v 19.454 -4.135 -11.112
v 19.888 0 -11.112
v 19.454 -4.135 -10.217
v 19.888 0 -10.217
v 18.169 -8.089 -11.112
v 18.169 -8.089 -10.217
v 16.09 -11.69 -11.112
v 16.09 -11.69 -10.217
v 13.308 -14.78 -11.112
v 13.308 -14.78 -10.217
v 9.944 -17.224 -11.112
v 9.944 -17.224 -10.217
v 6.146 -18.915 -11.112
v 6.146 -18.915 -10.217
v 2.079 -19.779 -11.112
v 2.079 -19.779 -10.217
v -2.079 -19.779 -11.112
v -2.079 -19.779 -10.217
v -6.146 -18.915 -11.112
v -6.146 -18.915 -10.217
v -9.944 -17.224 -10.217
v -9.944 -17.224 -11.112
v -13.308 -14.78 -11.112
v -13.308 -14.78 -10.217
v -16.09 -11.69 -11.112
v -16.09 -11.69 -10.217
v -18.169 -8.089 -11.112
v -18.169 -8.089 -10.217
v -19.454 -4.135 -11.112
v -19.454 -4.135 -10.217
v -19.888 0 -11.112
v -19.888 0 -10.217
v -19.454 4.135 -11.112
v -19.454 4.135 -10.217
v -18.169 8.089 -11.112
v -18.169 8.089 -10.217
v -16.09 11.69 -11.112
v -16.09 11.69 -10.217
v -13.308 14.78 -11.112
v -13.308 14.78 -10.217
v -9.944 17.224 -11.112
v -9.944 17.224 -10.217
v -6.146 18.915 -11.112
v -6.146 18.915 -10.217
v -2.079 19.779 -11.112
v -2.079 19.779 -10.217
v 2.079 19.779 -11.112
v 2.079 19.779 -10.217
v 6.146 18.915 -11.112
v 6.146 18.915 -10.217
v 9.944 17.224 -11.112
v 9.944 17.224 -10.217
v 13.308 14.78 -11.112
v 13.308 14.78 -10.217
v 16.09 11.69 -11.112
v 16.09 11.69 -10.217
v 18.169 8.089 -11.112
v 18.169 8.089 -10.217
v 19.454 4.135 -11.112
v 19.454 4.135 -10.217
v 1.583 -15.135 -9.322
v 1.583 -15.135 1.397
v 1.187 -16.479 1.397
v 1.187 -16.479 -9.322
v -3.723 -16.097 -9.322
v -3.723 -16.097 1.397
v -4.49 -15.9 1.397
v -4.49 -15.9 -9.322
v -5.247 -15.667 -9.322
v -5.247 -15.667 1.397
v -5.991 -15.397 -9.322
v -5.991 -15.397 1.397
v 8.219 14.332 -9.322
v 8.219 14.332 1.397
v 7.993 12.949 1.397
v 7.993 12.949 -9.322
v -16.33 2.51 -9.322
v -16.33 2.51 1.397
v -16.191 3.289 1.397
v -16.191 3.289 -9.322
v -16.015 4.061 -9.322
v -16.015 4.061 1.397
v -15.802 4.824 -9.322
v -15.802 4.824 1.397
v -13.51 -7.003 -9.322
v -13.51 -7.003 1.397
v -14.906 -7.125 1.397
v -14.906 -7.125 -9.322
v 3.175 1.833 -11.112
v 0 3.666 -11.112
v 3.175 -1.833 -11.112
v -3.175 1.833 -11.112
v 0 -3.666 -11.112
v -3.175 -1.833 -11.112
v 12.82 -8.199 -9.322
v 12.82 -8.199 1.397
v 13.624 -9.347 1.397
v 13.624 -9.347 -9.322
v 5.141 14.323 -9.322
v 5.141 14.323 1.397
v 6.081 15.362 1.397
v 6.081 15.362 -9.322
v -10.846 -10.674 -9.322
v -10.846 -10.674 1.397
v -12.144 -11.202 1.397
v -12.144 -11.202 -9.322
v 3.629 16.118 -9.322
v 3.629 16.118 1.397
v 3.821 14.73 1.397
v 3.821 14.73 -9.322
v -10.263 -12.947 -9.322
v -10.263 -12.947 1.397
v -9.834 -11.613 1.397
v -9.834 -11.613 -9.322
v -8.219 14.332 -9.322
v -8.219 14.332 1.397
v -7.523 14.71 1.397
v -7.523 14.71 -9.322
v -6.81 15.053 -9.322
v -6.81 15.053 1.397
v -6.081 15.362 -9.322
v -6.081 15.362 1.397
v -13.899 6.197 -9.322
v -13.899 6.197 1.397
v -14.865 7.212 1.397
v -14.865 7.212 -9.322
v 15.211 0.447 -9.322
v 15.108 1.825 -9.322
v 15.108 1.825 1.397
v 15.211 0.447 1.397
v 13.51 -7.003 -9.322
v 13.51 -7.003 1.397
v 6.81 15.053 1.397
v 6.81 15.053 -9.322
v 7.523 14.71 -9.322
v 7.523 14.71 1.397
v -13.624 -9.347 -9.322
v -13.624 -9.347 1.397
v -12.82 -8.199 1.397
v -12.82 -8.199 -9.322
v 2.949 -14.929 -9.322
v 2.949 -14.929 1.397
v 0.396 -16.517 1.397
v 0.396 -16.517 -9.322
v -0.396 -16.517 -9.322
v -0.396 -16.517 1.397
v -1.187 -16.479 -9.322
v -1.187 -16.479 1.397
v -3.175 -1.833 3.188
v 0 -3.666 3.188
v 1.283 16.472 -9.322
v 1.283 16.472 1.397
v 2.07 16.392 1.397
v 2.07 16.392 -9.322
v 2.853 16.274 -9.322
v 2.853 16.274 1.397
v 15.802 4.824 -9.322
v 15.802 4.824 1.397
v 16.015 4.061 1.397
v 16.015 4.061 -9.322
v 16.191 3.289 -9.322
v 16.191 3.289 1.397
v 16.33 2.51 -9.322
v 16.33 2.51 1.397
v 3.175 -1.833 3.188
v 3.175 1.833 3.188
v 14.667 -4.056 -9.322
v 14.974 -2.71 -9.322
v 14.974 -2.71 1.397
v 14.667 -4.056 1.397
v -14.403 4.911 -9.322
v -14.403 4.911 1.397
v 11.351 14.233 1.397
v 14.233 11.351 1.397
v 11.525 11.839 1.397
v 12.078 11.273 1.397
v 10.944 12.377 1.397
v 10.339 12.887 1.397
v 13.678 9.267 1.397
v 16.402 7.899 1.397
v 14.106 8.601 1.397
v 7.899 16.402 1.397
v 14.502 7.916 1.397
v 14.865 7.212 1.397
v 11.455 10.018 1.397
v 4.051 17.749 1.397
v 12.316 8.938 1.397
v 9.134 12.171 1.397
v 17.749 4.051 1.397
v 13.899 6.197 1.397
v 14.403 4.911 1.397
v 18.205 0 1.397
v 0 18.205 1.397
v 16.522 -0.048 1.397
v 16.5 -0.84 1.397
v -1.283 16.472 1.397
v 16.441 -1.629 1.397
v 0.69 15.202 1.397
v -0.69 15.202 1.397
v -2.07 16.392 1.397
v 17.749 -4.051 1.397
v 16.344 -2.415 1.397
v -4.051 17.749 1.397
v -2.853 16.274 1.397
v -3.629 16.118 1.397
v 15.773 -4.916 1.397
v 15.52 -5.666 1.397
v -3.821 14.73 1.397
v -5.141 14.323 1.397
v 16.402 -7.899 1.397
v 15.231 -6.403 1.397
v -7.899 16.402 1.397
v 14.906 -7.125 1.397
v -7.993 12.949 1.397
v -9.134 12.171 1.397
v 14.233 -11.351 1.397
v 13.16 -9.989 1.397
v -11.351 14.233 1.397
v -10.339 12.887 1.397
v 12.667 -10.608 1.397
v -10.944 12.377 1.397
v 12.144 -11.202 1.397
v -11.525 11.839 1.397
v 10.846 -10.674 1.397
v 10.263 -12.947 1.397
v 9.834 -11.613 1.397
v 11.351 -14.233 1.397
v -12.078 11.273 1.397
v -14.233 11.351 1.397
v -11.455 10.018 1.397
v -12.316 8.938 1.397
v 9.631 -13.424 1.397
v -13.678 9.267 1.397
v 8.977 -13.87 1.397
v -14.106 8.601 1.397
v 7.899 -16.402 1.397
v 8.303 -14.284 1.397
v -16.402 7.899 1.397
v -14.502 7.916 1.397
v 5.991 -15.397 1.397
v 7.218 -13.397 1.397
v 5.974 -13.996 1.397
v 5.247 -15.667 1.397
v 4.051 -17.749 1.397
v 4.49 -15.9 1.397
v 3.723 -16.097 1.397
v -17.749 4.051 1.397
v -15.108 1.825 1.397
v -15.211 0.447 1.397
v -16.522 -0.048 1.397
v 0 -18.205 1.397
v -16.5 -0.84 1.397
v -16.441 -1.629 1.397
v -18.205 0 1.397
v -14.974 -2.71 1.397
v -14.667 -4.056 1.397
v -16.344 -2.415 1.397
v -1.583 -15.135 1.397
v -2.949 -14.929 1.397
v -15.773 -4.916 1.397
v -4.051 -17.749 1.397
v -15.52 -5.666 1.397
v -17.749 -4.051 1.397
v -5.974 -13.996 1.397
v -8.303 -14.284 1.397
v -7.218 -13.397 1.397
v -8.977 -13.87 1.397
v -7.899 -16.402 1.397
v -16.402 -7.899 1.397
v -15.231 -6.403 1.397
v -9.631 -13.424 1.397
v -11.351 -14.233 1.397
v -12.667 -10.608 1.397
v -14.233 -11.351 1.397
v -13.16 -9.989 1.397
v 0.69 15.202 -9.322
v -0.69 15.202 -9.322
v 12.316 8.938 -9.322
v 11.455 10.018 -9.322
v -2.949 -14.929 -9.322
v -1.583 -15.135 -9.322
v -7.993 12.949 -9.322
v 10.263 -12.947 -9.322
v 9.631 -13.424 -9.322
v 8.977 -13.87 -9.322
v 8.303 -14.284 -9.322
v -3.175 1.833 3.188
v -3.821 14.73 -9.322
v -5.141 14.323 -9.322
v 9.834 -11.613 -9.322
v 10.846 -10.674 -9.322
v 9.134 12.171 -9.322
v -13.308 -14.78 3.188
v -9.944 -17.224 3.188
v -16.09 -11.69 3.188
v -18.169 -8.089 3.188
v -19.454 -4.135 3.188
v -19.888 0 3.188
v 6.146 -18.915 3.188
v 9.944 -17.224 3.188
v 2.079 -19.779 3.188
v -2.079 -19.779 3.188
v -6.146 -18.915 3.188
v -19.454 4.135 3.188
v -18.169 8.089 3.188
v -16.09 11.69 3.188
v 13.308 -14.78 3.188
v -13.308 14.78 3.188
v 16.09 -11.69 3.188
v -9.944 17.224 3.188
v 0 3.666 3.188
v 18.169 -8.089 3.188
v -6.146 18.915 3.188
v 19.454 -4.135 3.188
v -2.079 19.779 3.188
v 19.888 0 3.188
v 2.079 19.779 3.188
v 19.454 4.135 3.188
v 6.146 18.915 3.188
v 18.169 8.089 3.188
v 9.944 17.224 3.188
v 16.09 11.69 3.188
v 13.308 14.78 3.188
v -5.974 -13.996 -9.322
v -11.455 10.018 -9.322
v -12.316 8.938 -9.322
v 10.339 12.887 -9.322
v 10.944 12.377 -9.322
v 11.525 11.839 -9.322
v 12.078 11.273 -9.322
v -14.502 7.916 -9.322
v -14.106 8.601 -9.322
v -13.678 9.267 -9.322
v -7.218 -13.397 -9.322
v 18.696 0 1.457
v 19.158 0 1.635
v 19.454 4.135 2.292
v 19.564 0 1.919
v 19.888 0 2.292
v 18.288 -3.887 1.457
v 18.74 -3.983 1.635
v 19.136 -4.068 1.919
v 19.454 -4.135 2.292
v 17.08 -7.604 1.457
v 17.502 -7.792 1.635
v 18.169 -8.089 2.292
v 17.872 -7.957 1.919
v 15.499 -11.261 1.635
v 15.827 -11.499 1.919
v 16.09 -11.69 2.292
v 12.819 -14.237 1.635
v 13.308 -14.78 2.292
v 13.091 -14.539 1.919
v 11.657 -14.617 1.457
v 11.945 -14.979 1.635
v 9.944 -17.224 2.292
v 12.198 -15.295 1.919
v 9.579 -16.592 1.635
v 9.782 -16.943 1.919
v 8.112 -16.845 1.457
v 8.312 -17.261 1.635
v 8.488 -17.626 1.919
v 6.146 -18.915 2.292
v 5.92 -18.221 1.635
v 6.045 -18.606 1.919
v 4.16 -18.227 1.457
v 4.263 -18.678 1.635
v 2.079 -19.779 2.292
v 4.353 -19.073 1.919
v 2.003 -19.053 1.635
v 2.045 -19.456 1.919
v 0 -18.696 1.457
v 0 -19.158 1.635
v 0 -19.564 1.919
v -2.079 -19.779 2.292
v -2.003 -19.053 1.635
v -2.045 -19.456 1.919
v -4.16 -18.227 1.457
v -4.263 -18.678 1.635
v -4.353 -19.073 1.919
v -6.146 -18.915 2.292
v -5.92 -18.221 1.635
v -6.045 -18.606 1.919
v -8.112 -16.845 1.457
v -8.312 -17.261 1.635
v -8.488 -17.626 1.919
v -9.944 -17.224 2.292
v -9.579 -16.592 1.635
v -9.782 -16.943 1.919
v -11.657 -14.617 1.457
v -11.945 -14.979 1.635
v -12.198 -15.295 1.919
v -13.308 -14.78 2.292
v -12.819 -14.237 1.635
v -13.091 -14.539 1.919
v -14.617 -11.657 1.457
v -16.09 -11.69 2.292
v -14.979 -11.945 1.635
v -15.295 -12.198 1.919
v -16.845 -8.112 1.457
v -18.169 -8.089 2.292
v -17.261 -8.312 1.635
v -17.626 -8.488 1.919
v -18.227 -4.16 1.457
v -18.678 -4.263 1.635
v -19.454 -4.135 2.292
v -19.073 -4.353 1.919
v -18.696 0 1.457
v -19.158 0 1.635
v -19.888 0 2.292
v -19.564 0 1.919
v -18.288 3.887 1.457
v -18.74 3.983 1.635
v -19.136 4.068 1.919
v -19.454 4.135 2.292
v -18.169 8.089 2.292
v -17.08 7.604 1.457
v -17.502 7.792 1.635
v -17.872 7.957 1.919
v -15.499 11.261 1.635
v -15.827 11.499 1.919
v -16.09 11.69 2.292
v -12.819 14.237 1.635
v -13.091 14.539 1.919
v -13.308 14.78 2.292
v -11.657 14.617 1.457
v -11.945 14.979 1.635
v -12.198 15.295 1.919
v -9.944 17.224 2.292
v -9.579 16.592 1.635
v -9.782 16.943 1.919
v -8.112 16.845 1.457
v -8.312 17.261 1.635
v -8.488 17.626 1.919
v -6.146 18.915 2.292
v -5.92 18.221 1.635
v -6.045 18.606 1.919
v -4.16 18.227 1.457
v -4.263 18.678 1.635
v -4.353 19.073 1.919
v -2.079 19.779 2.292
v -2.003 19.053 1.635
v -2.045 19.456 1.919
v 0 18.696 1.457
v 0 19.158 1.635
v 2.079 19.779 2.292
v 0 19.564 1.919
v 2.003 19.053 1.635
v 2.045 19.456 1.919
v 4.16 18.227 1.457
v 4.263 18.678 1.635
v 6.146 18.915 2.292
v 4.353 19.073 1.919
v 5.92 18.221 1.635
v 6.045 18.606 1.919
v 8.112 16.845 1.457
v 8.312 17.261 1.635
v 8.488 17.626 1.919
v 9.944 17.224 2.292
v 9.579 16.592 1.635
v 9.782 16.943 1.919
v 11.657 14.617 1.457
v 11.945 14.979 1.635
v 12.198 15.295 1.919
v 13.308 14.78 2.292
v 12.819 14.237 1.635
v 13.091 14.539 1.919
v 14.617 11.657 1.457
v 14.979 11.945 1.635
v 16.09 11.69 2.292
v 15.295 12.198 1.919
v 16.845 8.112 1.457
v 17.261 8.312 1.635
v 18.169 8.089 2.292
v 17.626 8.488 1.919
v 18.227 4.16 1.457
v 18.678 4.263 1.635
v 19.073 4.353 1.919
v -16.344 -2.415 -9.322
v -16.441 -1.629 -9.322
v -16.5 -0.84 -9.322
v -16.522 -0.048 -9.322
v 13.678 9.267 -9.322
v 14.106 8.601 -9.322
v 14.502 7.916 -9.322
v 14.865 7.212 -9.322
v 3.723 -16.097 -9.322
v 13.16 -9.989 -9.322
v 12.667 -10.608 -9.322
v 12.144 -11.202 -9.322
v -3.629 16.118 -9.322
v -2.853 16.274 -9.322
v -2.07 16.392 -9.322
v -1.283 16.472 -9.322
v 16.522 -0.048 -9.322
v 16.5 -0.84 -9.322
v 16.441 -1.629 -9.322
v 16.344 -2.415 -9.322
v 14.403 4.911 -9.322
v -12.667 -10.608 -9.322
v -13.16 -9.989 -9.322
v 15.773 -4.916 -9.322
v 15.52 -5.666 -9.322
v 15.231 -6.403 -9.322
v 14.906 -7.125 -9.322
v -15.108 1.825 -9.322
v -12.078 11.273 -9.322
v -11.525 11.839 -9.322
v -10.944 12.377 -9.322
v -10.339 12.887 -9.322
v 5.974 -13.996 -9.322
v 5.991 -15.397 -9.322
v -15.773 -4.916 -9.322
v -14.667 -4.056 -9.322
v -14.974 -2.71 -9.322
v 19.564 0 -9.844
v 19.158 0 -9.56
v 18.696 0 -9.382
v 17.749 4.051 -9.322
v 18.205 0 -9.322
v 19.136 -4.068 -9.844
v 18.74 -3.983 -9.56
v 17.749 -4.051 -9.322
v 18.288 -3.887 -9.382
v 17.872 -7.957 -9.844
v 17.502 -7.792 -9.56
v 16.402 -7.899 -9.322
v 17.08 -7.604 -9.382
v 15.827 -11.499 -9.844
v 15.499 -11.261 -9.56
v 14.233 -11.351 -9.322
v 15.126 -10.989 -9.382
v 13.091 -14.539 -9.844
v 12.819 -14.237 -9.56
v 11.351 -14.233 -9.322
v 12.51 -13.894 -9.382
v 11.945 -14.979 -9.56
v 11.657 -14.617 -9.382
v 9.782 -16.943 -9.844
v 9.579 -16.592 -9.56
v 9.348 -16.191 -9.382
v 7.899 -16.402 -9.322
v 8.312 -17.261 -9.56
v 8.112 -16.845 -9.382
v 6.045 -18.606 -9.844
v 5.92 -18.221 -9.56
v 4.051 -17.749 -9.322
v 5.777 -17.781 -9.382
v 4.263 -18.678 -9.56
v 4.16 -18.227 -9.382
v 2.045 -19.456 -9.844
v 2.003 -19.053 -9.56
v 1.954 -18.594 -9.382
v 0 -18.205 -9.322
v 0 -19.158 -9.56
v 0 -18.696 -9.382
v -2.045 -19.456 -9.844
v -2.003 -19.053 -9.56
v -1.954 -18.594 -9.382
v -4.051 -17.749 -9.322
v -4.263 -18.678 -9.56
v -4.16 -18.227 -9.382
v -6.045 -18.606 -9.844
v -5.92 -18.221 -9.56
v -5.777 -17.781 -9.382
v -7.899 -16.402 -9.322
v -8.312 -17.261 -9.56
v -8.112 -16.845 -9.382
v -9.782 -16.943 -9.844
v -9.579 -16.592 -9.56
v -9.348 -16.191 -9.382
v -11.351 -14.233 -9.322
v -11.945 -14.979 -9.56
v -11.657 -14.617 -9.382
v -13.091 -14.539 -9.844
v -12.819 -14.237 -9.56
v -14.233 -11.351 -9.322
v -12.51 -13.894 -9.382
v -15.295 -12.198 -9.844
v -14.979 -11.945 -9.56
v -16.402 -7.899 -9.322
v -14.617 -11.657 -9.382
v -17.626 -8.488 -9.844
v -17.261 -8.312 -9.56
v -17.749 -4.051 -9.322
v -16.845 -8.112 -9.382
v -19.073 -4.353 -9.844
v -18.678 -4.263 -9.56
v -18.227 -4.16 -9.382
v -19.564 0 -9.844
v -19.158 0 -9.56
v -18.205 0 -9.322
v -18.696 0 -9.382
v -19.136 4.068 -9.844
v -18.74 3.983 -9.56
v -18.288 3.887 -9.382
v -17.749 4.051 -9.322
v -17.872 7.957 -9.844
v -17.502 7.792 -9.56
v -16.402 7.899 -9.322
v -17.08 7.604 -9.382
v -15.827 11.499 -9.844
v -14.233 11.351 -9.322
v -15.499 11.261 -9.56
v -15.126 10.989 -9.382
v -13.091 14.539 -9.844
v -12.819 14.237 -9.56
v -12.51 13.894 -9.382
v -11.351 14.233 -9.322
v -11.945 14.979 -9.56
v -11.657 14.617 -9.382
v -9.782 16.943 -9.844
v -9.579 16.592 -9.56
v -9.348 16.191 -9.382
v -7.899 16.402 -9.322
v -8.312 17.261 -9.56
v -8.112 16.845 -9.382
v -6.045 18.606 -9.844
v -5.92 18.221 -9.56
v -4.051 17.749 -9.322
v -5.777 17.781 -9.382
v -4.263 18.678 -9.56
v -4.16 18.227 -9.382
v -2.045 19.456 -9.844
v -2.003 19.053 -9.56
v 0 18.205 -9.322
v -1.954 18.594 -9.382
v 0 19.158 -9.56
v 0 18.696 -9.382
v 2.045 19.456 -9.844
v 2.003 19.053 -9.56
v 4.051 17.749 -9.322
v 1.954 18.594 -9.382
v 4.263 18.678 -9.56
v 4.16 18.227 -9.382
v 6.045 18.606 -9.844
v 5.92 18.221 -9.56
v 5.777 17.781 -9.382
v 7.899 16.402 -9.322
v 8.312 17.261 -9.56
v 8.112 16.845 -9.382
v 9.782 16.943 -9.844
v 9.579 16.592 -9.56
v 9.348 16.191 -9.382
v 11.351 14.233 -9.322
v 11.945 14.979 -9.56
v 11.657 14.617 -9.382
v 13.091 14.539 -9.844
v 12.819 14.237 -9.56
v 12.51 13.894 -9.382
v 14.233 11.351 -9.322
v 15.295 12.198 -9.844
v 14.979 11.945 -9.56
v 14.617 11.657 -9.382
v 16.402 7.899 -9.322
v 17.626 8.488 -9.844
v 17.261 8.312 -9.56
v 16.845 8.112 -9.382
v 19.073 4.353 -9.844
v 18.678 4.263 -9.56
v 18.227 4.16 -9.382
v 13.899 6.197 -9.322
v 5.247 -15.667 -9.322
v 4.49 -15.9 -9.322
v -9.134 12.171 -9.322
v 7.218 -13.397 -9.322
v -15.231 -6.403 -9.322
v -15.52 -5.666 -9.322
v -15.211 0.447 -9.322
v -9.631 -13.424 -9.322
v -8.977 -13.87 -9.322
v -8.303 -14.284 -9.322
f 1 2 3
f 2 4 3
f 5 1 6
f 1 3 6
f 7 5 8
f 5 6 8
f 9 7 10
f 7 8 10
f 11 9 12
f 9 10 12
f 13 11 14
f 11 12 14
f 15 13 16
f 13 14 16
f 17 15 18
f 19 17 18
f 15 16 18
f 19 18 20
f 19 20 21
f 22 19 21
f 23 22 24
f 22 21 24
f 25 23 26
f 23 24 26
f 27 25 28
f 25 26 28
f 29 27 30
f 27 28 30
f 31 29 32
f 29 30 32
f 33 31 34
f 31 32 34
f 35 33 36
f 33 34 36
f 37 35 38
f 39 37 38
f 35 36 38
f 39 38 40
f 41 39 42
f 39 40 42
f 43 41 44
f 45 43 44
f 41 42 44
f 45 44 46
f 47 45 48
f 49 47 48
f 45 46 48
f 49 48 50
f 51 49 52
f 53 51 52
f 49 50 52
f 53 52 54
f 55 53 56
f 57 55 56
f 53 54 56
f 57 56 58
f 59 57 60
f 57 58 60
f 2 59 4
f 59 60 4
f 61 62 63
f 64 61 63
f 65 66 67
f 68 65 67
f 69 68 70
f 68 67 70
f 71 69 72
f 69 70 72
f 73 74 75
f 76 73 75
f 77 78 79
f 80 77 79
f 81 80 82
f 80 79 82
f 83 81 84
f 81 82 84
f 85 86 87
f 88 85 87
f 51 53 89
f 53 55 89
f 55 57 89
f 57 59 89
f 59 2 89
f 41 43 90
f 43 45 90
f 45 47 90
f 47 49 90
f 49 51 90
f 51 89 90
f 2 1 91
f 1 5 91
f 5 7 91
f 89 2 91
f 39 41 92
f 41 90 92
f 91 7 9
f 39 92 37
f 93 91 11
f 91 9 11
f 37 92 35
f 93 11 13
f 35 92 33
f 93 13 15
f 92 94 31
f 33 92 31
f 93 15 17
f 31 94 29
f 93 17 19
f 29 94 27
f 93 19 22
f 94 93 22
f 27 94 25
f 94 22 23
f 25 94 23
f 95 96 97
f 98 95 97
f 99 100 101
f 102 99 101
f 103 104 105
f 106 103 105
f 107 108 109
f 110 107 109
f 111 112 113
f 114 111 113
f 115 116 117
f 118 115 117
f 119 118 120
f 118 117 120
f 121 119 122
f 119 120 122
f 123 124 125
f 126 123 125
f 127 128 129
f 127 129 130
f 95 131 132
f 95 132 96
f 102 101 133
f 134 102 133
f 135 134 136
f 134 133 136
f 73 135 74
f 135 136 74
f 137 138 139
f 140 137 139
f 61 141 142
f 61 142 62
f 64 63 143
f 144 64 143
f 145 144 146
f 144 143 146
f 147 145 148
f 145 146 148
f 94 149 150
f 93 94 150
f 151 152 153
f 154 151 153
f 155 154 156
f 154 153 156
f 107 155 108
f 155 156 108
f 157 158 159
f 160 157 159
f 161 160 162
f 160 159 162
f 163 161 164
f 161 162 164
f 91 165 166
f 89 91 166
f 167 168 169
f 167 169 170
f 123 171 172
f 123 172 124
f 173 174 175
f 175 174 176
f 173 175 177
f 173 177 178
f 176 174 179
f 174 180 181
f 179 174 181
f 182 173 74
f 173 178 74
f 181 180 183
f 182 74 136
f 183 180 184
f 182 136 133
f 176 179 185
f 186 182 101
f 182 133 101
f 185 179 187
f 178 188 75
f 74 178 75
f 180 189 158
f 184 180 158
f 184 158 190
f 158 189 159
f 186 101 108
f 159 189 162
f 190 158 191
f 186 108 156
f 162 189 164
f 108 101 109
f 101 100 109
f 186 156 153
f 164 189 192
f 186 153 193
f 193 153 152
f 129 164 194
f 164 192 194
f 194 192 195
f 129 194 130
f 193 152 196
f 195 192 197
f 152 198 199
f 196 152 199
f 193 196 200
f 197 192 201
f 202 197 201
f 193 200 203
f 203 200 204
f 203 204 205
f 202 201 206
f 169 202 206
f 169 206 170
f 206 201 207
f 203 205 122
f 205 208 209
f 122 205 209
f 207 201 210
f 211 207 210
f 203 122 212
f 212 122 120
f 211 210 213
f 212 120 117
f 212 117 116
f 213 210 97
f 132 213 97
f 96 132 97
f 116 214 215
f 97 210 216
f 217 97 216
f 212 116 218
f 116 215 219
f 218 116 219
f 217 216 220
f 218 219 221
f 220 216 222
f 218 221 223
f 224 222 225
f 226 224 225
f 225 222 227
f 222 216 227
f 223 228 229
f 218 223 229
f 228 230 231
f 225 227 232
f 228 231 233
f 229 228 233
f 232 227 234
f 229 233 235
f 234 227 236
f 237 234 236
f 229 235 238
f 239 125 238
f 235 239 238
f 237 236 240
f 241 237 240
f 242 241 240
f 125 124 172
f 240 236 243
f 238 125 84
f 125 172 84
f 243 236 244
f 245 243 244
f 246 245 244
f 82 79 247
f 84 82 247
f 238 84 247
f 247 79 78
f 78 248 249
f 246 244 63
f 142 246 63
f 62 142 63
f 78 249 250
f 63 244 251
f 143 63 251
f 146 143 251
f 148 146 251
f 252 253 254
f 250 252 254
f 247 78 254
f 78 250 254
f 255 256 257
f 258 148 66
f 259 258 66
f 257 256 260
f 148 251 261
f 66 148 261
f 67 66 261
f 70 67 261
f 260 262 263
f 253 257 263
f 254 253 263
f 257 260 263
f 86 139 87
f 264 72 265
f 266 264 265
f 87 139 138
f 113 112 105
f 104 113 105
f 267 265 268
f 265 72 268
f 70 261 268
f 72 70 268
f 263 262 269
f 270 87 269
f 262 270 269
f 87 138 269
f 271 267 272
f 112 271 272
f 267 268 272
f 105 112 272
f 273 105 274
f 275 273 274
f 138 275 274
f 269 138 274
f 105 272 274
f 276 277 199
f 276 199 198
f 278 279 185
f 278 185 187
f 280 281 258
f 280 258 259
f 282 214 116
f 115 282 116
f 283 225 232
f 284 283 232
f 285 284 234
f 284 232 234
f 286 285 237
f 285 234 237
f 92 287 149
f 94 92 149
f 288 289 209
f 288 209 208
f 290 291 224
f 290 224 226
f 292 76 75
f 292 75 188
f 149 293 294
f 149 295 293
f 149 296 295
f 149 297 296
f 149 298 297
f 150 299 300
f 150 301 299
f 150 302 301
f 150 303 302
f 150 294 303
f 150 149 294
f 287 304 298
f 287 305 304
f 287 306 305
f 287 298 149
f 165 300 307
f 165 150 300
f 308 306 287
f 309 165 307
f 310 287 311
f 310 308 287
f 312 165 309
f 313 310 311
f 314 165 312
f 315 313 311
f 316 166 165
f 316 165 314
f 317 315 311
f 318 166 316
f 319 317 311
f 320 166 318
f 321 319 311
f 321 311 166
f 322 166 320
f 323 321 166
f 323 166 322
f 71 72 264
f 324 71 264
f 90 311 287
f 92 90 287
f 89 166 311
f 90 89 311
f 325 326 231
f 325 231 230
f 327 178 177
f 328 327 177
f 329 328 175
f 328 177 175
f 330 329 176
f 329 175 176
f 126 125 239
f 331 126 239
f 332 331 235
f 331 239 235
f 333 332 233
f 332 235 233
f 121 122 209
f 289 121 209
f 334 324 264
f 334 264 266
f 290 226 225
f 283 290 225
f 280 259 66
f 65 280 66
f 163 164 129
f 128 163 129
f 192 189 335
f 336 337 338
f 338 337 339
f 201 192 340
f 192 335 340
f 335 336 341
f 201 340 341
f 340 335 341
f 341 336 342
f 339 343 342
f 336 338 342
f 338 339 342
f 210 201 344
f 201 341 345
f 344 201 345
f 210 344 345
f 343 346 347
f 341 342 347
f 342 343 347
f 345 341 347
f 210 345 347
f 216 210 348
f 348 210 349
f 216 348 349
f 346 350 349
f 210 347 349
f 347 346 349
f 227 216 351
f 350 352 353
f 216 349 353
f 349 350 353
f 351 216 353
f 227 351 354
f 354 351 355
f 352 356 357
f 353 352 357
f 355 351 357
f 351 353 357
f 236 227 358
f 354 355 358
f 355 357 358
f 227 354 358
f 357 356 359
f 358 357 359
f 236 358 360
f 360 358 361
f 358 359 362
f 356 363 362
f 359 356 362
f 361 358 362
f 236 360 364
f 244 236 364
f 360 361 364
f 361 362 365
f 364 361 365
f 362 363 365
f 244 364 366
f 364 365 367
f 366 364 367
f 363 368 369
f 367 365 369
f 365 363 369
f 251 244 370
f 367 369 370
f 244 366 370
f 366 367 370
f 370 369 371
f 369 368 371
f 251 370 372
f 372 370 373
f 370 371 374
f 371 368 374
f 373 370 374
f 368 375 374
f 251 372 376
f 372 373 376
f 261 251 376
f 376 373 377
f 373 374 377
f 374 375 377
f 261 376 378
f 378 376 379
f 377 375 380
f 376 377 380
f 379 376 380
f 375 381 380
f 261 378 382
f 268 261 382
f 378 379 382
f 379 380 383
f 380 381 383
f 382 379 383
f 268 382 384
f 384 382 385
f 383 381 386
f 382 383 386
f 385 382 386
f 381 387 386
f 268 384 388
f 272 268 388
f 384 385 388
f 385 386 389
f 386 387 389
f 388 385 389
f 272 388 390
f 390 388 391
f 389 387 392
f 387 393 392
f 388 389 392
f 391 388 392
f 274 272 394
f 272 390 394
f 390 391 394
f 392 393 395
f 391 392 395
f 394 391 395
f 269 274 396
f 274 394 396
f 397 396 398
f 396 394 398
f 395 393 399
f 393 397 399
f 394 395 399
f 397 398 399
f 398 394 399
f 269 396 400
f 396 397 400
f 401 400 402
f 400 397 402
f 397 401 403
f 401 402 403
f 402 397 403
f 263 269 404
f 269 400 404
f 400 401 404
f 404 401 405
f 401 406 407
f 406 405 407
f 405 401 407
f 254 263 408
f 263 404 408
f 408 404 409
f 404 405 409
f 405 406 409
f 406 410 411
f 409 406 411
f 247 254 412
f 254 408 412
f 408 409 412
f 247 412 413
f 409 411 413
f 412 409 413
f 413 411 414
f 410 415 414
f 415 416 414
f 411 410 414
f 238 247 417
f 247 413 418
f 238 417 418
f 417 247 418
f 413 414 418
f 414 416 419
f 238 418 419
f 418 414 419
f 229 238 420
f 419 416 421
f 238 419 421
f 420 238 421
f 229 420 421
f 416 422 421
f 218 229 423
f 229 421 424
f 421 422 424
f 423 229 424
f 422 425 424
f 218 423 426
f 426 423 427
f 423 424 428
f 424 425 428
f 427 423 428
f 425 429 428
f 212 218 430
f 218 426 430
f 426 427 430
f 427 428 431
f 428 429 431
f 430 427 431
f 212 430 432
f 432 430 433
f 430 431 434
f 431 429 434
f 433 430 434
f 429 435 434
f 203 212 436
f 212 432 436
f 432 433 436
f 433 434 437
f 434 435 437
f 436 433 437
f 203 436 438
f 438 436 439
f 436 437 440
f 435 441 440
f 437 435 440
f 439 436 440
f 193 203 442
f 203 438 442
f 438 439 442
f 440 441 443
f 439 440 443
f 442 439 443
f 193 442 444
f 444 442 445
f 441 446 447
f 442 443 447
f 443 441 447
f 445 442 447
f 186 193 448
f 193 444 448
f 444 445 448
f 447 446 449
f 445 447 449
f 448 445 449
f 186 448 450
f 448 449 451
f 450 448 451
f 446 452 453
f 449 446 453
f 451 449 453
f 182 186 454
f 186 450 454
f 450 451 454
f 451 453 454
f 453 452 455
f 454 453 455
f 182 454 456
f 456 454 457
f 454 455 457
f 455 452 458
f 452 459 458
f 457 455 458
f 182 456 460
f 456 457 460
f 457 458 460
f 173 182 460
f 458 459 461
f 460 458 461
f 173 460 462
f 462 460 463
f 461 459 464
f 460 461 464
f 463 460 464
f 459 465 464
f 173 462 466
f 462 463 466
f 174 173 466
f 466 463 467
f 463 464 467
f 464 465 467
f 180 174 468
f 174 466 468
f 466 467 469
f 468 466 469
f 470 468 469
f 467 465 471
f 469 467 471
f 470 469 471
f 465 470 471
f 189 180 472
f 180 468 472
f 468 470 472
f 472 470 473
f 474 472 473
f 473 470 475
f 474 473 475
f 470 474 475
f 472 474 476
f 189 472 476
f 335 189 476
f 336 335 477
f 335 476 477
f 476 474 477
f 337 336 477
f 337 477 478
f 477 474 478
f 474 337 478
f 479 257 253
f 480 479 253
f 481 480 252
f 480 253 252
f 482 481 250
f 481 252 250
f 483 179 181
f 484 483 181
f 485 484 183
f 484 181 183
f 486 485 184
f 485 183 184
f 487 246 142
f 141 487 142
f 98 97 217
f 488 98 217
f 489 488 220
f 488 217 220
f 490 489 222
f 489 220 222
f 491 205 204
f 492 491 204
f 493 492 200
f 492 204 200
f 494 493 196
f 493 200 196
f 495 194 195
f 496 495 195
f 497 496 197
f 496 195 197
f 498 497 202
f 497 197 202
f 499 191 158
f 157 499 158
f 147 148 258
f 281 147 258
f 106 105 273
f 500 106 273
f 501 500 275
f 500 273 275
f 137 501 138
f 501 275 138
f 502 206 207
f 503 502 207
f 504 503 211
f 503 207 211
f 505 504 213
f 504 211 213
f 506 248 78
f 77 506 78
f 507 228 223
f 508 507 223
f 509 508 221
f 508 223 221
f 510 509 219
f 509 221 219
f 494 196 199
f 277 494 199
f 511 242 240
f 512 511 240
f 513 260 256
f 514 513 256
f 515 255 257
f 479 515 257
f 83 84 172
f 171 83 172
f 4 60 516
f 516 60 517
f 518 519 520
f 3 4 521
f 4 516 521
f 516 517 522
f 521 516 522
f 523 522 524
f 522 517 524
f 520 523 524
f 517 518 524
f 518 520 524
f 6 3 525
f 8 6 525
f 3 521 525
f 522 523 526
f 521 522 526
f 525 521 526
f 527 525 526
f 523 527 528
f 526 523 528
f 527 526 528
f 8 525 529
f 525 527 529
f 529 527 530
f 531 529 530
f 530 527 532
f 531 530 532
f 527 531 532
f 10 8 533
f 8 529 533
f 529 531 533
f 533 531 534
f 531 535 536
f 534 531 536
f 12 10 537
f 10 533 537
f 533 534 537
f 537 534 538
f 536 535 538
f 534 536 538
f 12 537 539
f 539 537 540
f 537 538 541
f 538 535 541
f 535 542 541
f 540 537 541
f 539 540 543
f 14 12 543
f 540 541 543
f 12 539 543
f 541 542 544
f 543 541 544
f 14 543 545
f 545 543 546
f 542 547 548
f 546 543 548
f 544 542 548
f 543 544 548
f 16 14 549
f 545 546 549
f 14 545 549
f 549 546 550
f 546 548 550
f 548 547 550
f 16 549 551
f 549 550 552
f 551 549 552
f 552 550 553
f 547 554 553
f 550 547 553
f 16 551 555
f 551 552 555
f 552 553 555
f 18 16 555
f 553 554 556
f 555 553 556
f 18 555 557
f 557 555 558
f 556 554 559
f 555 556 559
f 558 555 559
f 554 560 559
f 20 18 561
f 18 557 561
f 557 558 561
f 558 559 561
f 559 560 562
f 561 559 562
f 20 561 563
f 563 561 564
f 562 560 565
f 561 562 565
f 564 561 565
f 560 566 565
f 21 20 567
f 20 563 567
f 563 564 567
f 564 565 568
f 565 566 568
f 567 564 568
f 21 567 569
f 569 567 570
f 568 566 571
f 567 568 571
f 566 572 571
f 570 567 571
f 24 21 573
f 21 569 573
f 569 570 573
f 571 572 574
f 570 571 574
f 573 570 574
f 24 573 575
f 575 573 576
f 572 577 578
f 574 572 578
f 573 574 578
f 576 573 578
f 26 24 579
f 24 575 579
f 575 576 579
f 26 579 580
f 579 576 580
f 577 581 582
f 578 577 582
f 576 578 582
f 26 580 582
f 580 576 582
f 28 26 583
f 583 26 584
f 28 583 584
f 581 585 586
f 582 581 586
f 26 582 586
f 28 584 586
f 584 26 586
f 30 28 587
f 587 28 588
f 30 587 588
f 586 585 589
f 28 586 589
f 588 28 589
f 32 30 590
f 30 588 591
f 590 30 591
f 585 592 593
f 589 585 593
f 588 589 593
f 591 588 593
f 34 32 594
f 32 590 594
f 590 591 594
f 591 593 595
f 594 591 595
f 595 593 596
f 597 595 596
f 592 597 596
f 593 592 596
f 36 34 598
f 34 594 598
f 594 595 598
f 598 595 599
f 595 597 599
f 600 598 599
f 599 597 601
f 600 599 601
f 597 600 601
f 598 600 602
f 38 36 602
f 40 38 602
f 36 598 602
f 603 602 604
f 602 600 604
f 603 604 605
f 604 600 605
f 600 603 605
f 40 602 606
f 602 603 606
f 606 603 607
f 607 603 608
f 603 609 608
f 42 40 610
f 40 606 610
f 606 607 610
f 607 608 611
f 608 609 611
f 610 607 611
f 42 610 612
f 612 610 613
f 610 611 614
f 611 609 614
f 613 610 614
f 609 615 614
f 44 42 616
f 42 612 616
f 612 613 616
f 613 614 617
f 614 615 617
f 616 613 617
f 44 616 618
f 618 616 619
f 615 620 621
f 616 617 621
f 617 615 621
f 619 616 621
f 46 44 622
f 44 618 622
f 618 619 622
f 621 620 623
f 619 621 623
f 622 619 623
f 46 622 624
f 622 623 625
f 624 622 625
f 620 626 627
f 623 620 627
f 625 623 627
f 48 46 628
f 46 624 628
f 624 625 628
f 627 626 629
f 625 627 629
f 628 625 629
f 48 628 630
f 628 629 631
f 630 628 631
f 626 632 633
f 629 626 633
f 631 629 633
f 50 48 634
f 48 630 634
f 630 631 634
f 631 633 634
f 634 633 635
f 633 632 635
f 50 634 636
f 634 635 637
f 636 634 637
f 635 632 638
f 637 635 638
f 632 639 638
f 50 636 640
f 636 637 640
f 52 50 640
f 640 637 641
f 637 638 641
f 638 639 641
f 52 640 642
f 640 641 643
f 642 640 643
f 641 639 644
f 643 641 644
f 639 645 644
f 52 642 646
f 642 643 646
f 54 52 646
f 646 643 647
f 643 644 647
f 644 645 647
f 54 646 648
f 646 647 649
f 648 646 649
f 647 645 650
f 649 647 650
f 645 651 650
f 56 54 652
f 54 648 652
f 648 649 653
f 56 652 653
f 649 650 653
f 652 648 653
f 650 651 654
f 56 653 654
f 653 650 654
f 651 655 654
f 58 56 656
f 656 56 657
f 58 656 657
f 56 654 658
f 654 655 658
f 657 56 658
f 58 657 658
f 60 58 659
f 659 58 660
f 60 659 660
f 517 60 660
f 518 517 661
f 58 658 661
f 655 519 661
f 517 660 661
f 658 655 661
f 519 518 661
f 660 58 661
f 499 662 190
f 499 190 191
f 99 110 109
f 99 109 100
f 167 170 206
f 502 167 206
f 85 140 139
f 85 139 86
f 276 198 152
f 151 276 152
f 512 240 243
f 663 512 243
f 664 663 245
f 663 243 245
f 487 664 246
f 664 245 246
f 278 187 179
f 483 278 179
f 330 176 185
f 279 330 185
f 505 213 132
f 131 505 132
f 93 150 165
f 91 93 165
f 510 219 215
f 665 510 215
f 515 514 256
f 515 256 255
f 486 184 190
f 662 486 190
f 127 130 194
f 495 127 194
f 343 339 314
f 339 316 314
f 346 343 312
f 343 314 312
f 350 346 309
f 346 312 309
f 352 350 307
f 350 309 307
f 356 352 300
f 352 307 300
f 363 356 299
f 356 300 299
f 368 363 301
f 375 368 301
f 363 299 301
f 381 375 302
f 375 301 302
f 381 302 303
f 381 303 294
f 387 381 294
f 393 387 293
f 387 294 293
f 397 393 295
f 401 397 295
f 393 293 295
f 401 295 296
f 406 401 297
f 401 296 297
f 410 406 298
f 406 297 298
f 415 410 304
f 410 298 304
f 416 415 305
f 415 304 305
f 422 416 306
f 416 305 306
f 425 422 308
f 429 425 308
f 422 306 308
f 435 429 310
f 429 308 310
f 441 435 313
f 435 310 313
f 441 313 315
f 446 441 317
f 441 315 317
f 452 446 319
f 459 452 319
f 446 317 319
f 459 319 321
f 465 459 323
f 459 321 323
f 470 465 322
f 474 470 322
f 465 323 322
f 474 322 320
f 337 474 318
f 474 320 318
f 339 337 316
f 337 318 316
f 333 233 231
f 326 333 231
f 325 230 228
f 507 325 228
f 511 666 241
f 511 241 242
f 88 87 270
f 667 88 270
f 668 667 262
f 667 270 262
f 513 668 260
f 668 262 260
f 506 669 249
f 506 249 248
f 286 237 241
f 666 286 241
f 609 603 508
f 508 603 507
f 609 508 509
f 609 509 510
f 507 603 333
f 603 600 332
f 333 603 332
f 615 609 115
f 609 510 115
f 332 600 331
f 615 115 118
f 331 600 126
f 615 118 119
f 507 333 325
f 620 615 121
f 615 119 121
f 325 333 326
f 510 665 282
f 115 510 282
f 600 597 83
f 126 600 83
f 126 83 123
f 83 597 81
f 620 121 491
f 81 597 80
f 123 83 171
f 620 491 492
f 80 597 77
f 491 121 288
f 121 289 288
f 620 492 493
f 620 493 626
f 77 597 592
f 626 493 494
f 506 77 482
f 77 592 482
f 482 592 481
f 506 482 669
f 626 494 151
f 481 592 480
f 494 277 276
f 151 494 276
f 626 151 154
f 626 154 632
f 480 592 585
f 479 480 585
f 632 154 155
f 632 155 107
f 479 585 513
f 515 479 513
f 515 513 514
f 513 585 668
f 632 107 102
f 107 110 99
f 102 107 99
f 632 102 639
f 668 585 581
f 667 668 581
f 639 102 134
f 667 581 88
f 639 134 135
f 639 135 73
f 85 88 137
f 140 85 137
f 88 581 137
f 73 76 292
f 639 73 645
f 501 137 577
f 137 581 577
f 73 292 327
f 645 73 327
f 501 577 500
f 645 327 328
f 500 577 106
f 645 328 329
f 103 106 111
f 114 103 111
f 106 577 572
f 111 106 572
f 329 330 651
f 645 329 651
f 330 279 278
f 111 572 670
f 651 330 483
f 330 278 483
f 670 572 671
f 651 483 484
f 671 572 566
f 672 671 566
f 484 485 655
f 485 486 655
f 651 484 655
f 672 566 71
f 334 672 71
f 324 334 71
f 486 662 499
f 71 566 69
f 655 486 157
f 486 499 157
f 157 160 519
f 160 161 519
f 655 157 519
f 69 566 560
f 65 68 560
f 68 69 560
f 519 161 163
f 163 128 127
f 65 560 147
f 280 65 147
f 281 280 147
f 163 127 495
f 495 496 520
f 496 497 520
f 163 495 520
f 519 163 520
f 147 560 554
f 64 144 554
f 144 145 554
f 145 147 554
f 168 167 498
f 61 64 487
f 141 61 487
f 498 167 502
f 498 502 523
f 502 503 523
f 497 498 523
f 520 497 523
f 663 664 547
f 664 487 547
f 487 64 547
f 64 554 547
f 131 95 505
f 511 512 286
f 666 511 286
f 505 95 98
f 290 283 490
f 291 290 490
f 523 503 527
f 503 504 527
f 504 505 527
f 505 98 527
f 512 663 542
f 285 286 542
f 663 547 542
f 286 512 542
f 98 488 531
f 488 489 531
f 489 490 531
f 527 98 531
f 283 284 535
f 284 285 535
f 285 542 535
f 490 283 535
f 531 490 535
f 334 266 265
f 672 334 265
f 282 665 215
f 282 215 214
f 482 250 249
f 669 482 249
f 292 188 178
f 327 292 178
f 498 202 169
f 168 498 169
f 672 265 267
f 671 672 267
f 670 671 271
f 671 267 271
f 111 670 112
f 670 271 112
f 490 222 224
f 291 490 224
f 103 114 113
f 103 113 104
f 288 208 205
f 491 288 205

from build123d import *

# Parameters (mm, degrees)
CUT_EXTRUDE1_START = 1.397
CUT_EXTRUDE1_DEPTH = 10.7188
CIRPATTERN1_COUNT  = 21
SKETCH4_R          = 1.5875
CUT_EXTRUDE2_DEPTH = 31.241836167
CUT_EXTRUDE3_DEPTH = 1.190625
CIRPATTERN2_COUNT  = 2
CIRPATTERN2_ANGLE  = 90
CUT_EXTRUDE4_DEPTH = 50.8
SKETCH8_R          = 12.7
CUT_EXTRUDE5_DEPTH = 50.8


with BuildPart() as part:
    # Sketch2 → Revolve1 (revolve)
    with BuildSketch(Plane(origin=(0, 0, 0), x_dir=(0, 0, -1), z_dir=(1, 0, 0)), mode=Mode.PRIVATE) as revolve1_sk:
        with BuildLine():
            Line((-11.1125, 3.175), (11.1125, 3.175))
            Line((11.1125, 3.175), (11.1125, 19.8882))
            Line((11.1125, 19.8882), (10.21715, 19.8882))
            ThreePointArc((10.21715, 19.8882), (9.559562343, 19.158250378), (9.3218, 18.204983865))
            Line((9.3218, 18.204983865), (9.3218, 16.521767729))
            Line((9.3218, 16.521767729), (-1.397, 16.521767729))
            Line((-1.397, 16.521767729), (-1.397, 18.204983865))
            ThreePointArc((-1.397, 18.204983865), (-1.634762343, 19.158250378), (-2.29235, 19.8882))
            Line((-2.29235, 19.8882), (-3.1877, 19.8882))
            Line((-3.1877, 19.8882), (-3.1877, 11.9126))
            Line((-3.1877, 11.9126), (-11.1125, 11.9126))
            Line((-11.1125, 11.9126), (-11.1125, 3.175))
        make_face()
    revolve(revolve1_sk.sketch.rotate(Axis((0, 0, 11.1125), (0, 0, -1)), 90), axis=Axis((0, 0, 11.1125), (0, 0, -1)))

    # Sketch3 → Cut-Extrude1 (cut)
    with BuildSketch(Plane.XY.offset(CUT_EXTRUDE1_START)):
        with BuildLine():
            Line((-0.690489274, 15.2019), (0.690489274, 15.2019))
            Line((0.690489274, 15.2019), (1.2827, 16.4719))
            ThreePointArc((1.2827, 16.4719), (0, 16.521767729), (-1.2827, 16.4719))
            Line((-1.2827, 16.4719), (-0.690489274, 15.2019))
        make_face()
    cut_extrude1 = extrude(amount=-CUT_EXTRUDE1_DEPTH, mode=Mode.SUBTRACT)

    # CirPattern1: Cut-Extrude1 ×21 about axis
    cirpattern1_axis = Axis((0, 0, 0), (0, 0, 1))
    for i in range(1, CIRPATTERN1_COUNT):
        add(cut_extrude1.rotate(cirpattern1_axis, i * 360 / CIRPATTERN1_COUNT), mode=Mode.SUBTRACT)

    # Sketch4 → Cut-Extrude2 (cut, through all)
    with BuildSketch(Plane(origin=(0, 0, 0), x_dir=(1, 0, 0), z_dir=(0, 1, 0))):
        with Locations(Location((0, -7.1501, 0), (0, 0, 90))):
            Circle(SKETCH4_R)
    cut_extrude2 = extrude(amount=CUT_EXTRUDE2_DEPTH, mode=Mode.SUBTRACT)

    # Sketch5 → Revolve2 (revolve)
    with BuildSketch(Plane.XY.offset(7.1501), mode=Mode.PRIVATE) as revolve2_sk:
        Polygon((1.0795, 11.806349246), (1.5875, 11.298349246), (1.5875, 3.81), (0.9525, 3.175), (0, 3.175), (0, 11.806349246), align=None)
    revolve2 = revolve(revolve2_sk.sketch.rotate(Axis((0, 0, 7.1501), (0, 1, 0)), 90), axis=Axis((0, 0, 7.1501), (0, 1, 0)))

    # Sketch6 → Cut-Extrude3 (cut)
    with BuildSketch(Plane(origin=(0, 11.806349246, 0), x_dir=(1, 0, 0), z_dir=(0, 1, 0))):
        Polygon((0, -6.233556448), (-0.79375, -6.691828224), (-0.79375, -7.608371776), (0, -8.066643552), (0.79375, -7.608371776), (0.79375, -6.691828224), align=None)
    cut_extrude3 = extrude(amount=-CUT_EXTRUDE3_DEPTH, mode=Mode.SUBTRACT)

    # CirPattern2: Cut-Extrude2, Revolve2, Cut-Extrude3 ×2 about axis
    cirpattern2_axis = Axis((0, 0, 0), (0, 0, -1))
    add([cut_extrude2.rotate(cirpattern2_axis, i * CIRPATTERN2_ANGLE / (CIRPATTERN2_COUNT - 1)) for i in range(1, CIRPATTERN2_COUNT)], mode=Mode.SUBTRACT)
    add([revolve2.rotate(cirpattern2_axis, i * CIRPATTERN2_ANGLE / (CIRPATTERN2_COUNT - 1)) for i in range(1, CIRPATTERN2_COUNT)])
    add([cut_extrude3.rotate(cirpattern2_axis, i * CIRPATTERN2_ANGLE / (CIRPATTERN2_COUNT - 1)) for i in range(1, CIRPATTERN2_COUNT)], mode=Mode.SUBTRACT)

    # Sketch7 → Cut-Extrude4 (cut)
    with BuildSketch(Plane.XY.offset(11.1125)):
        Polygon((0, 3.666174209), (-3.175, 1.833087105), (-3.175, -1.833087105), (0, -3.666174209), (3.175, -1.833087105), (3.175, 1.833087105), align=None)
    extrude(amount=-CUT_EXTRUDE4_DEPTH, mode=Mode.SUBTRACT)

    # Sketch8 → Cut-Extrude5 (cut)
    with BuildSketch(Plane.XY.offset(3.1877)):
        Circle(SKETCH8_R)
    extrude(amount=CUT_EXTRUDE5_DEPTH, mode=Mode.SUBTRACT)


solid = part.part
